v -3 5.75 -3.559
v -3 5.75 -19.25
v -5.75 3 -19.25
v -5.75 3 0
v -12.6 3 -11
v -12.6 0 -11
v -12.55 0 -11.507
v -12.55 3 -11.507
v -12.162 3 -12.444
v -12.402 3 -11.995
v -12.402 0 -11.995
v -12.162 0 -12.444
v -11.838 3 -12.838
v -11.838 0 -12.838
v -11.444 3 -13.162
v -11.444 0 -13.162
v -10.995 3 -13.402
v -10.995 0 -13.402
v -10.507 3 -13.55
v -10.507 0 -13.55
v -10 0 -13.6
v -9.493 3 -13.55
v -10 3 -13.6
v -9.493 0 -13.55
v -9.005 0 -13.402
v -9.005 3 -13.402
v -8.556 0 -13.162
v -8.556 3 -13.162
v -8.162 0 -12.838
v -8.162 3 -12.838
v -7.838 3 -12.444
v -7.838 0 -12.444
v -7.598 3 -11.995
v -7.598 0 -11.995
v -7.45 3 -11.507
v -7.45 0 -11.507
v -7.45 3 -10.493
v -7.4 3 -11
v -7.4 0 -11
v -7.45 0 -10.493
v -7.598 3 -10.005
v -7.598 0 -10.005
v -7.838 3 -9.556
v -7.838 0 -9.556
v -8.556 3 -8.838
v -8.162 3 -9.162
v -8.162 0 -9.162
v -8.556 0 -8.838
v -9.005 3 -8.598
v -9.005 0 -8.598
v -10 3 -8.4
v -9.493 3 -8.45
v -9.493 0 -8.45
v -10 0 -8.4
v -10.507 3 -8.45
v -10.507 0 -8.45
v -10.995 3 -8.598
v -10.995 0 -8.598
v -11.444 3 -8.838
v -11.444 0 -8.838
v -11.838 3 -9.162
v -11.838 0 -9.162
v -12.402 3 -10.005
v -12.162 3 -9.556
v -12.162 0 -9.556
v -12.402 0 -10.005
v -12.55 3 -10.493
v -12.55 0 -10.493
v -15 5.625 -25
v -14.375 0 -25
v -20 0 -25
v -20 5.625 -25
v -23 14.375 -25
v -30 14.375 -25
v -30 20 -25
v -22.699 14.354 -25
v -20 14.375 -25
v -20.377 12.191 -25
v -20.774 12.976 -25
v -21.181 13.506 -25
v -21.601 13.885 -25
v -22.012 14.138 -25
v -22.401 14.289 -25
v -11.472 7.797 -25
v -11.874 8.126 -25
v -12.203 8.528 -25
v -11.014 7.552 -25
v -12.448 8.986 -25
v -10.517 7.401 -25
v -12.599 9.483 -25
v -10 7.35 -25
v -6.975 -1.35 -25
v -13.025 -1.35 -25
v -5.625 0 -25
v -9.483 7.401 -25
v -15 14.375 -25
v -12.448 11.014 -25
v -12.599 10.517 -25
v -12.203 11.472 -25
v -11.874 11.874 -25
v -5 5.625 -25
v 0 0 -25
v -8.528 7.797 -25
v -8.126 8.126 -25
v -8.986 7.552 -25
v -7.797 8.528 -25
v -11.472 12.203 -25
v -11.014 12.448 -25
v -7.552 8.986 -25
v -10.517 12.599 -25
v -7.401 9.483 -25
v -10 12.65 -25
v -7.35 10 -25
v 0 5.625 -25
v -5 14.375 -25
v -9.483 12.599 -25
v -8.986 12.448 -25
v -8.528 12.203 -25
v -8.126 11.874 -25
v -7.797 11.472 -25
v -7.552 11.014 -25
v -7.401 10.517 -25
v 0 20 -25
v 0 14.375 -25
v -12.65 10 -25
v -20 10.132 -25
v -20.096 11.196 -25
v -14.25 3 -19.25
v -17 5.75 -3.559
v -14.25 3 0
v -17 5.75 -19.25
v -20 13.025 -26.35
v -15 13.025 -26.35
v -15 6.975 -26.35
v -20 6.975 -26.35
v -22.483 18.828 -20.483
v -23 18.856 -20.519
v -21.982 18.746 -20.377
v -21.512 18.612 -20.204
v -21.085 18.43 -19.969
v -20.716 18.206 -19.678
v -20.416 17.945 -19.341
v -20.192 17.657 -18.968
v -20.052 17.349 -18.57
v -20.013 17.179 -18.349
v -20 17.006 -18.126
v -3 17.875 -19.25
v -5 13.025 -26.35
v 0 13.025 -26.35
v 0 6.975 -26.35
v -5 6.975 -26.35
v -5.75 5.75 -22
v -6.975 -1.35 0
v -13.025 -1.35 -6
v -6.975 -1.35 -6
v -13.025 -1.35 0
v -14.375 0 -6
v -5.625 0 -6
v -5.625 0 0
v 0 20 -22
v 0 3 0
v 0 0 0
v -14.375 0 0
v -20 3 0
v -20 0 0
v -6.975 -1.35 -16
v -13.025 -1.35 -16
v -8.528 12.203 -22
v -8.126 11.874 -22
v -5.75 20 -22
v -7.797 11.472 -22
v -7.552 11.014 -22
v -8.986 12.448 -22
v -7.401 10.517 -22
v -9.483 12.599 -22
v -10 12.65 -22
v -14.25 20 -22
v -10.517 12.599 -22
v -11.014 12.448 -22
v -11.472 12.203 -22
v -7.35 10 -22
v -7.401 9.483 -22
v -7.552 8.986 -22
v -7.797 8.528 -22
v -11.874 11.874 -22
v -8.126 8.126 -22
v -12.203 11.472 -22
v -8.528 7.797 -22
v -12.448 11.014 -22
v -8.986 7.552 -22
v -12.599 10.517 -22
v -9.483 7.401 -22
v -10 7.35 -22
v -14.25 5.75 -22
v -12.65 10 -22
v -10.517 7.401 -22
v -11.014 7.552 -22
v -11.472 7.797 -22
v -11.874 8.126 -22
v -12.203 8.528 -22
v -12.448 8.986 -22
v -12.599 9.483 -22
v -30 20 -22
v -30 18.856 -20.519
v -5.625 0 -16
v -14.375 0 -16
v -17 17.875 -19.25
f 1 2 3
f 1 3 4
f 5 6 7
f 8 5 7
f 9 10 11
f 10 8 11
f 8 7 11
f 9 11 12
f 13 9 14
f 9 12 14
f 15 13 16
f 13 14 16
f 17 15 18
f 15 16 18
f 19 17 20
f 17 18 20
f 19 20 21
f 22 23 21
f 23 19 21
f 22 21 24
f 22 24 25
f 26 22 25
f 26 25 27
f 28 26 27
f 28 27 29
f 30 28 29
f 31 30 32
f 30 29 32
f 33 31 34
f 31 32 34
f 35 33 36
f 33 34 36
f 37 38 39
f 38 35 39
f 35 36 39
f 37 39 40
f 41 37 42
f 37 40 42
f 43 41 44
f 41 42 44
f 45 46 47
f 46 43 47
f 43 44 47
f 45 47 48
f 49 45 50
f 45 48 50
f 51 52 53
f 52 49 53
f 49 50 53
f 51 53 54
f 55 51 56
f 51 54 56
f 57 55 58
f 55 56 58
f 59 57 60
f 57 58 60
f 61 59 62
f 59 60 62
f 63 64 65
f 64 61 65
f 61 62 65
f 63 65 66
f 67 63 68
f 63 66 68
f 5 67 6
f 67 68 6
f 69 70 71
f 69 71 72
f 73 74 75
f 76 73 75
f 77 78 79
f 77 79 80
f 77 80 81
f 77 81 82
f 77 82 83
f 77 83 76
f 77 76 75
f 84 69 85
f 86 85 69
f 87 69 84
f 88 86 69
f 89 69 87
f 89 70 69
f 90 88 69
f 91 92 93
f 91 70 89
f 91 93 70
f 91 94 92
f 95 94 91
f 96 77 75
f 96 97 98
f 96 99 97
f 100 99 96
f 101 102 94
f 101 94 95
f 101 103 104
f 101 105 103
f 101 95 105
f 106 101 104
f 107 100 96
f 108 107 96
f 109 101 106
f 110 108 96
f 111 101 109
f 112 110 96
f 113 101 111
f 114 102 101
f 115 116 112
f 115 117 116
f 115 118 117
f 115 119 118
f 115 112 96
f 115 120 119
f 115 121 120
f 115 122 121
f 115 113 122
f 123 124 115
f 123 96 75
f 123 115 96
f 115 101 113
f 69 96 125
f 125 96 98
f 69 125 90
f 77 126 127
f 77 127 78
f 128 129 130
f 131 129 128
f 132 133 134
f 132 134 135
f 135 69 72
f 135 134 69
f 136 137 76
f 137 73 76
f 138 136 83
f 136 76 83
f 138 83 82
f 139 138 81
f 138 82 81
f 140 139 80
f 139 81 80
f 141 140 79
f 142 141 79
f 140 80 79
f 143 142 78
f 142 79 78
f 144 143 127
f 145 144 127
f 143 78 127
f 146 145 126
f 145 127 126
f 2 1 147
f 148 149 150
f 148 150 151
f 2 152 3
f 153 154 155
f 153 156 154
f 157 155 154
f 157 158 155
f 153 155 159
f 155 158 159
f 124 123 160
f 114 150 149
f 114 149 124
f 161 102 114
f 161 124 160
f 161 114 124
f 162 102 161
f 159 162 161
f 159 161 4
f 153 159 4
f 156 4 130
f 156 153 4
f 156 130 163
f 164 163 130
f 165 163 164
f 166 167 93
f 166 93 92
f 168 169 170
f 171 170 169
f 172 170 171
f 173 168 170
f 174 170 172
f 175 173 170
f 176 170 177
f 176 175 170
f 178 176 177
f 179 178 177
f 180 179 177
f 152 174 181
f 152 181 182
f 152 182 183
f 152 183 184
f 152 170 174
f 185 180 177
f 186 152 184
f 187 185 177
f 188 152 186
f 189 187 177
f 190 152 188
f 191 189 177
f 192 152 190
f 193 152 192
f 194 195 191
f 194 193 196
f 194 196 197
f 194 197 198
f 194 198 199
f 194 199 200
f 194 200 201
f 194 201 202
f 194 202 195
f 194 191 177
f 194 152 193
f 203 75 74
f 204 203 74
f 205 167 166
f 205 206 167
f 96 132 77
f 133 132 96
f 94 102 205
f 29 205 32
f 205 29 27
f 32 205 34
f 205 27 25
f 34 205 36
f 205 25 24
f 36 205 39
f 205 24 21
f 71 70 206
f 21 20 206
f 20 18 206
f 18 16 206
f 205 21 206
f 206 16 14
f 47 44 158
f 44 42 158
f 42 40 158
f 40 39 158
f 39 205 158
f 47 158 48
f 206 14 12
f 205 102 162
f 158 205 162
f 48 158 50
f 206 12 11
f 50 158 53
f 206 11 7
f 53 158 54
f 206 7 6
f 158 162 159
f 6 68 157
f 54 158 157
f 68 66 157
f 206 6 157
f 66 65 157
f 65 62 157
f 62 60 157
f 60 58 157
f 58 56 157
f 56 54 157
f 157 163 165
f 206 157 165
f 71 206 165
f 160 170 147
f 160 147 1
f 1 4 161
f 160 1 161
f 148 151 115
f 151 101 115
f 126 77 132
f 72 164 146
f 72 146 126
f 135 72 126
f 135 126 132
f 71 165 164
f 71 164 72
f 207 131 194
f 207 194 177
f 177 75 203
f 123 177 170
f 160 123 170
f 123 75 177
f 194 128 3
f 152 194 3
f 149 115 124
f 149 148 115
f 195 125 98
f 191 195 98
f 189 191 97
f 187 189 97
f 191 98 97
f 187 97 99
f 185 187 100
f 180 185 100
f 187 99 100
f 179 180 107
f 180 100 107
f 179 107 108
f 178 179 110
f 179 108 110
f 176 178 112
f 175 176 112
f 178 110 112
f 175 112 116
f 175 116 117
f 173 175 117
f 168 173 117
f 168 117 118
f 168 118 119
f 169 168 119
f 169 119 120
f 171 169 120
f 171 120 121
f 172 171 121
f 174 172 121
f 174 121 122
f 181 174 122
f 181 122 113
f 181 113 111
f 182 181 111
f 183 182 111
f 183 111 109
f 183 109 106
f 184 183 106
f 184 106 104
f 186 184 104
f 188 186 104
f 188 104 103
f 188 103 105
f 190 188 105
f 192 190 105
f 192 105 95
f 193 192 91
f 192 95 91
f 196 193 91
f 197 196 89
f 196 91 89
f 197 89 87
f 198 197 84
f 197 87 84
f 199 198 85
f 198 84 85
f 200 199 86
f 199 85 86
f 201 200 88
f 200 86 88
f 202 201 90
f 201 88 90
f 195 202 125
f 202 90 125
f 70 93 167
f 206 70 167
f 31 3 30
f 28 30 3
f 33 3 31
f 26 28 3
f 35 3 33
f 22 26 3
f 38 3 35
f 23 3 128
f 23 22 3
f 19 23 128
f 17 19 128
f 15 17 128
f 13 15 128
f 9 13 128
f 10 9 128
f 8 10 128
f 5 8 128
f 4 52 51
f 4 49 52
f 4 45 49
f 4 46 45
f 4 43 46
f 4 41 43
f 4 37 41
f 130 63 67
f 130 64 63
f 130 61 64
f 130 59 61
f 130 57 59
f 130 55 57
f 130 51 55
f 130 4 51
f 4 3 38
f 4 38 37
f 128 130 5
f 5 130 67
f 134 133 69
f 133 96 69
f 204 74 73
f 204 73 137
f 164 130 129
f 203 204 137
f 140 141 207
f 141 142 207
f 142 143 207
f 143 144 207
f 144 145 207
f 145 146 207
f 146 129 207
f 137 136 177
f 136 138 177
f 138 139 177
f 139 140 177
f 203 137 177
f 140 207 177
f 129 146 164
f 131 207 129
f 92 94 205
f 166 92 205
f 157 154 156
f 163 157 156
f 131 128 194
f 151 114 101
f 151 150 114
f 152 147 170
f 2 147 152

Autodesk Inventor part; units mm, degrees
ref_plane "YZ Plane" through (0, 0, 0) normal (1, 0, 0) x (0, 1, 0)
ref_plane "XZ Plane" through (0, 0, 0) normal (0, 1, 0) x (-1, 0, 0)
sketch "Sketch1" plane through (0, 0, 0) normal (0, 1, 0) x (-1, 0, 0)
  line L0 (0, 0) -> (20, 0)
  line L1 (20, 0) -> (20, -25)
  line L2 (20, -25) -> (0, -25)
  line L3 (0, -25) -> (0, 0)
  circle A0 centre (10, -11) radius 2.6
  line L4 (20, -25) -> (0, -25)
  line L5 (0, -25) -> (0, -22)
  line L6 (0, -22) -> (20, -22)
  line L7 (20, -22) -> (20, -25)
  line L8 (0, -22) -> (20, 0) construction
  point P0 (10, -11)
  dimension "d2" = 20
  dimension "d3" = 25
  dimension "d4" = 5.2
  dimension "d7" = 3
extrude "Extrusion1" add sketch "Sketch1" along normal blind 3
extrude "Extrusion2" add sketch "Sketch1" along normal blind 20 contours L6 L1 L2 L3
sketch "Sketch2" plane through (0, 0, -25) normal (0, 0, -1) x (-1, 0, 0)
  line L0 (0, 0) -> (0, 20) projected
  line L1 (20, 0) -> (20, 20) projected
  line L2 (0, 20) -> (20, 0) construction
  circle A0 centre (10, 10) radius 2.65
  dimension "d10" = 5.3
extrude "Extrusion3" cut sketch "Sketch2" against normal through all
ref_plane "Work Plane1" through (-20, 20, -22) normal (0, -0.791285, -0.6114475) x (1, 0, 0)
sketch "Sketch3" plane through (-20, 20, -22) normal (0, -0.791285, -0.6114475) x (1, 0, 0)
  line L0 (0, 27.8029) -> (20, 27.8029) projected
  line L1 (0, 0) -> (20, 0) projected
  line L2 (0, 10.3946) -> (0, 0) projected
  line L3 (0, 0) -> (3, 0)
  line L4 (3, 0) -> (3, 27.8029)
  line L5 (3, 27.8029) -> (0, 27.8029)
  line L6 (0, 27.8029) -> (0, 0)
  line L7 (20, 27.8029) -> (17, 27.8029)
  line L8 (17, 27.8029) -> (17, 0)
  line L9 (17, 0) -> (20, 0)
  line L10 (20, 0) -> (20, 27.8029)
  point P0 (20, 29.6372)
  point P1 (20, 0)
  dimension "d13" = 3
  dimension "d14" = 3
extrude "Extrusion4" add sketch "Sketch3" along normal up to next contours L0 L4 L1 L2 L6 | L0 L10 L1 L8
chamfer "Chamfer1" distance 2.75 angle 45 5 edges at (-10, 3, -22) (-3, 11.5, -22) (-3, 3, -11) (-17, 3, -11) (-17, 11.5, -22)
sketch "Sketch4" plane through (0, 0, 0) normal (0, -1, 0) x (1, 0, 0)
  line L0 (0, -25) -> (-20, -25) projected
  line L1 (-20, 0) -> (0, 0) projected
  line L2 (-14.375, -25) -> (-5.625, -25)
  line L3 (-5.625, -25) -> (-5.625, 0)
  line L4 (-5.625, 0) -> (-14.375, 0)
  line L5 (-14.375, 0) -> (-14.375, -25)
  circle A0 centre (-10, -11) radius 2.6 projected
  line L6 (-10, -25) -> (-10, 0) construction
  line L7 (-5.625, -6) -> (-14.375, -6)
  line L8 (-14.375, -6) -> (-14.375, -16)
  line L9 (-14.375, -16) -> (-5.625, -16)
  line L10 (-5.625, -16) -> (-5.625, -6)
  line L11 (-14.375, -16) -> (-5.625, -6) construction
  point P0 (-14.375, 0)
  dimension "d32" = 8.75
  dimension "d42" = 10
extrude "Extrusion5" add sketch "Sketch4" along normal blind 1.35 contours L0 L5 L9 L3 | L7 L5 L1 L3
sketch "Sketch5" plane through (0, 20, -25) normal (0, 0, -1) x (-1, 0, 0)
  line L0 (0, 0) -> (0, -17) projected
  line L1 (20, -17) -> (20, 0) projected
  line L2 (0, -5.625) -> (20, -5.625)
  line L3 (20, -5.625) -> (20, -14.375)
  line L4 (20, -14.375) -> (0, -14.375)
  line L5 (0, -14.375) -> (0, -5.625)
  line L6 (0, -14.375) -> (20, -5.625) construction
  circle A0 centre (10, -10) radius 2.65 projected
  line L7 (5, -5.625) -> (15, -5.625)
  line L8 (15, -5.625) -> (15, -14.375)
  line L9 (15, -14.375) -> (5, -14.375)
  line L10 (5, -14.375) -> (5, -5.625)
  line L11 (5, -5.625) -> (15, -14.375) construction
  point P0 (0, -20)
  point P1 (0, -14.375)
  point P2 (5, -14.375)
  dimension "d26" = 8.75
  dimension "d43" = 10
extrude "Extrusion6" add sketch "Sketch5" along normal blind 1.35 contours L2 L10 L4 L0 | L2 L1 L4 L8
chamfer "Chamfer2" distance 1.35 angle 45 8 edges at (-17.5, 5.625, -26.35) (-2.5, 5.625, -26.35) (-17.5, 14.375, -26.35) (-2.5, 14.375, -26.35) (-14.375, -1.35, -3) (-14.375, -1.35, -20.5) (-5.625, -1.35, -3) (-5.625, -1.35, -20.5)
sketch "Sketch9" plane through (-20, 0, -25) normal (-1, 0, 0) x (0, 0, 1)
  line L0 (-1.35, 6.975) -> (-1.35, 13.025) projected
  line L1 (0, 0) -> (0, 5.625) projected
  line L2 (0, 0) -> (25, 0) projected
  line L3 (25, 0) -> (25, 3) projected
  line L4 (25, 3) -> (3, 20) projected
  line L5 (0, 20) -> (3, 20) projected
  line L6 (0, 14.375) -> (0, 20) projected
  line L7 (0, 14.375) -> (4.4808, 18.8558)
  line L8 (-1.35, 13.025) -> (0, 14.375) projected
  line L9 (0, 5.625) -> (-1.35, 6.975) projected
  point P0 (25, 0)
extrude "Extrusion10" add sketch "Sketch9" along normal blind 10 contours L6 L5 L4 L7
fillet "Fillet2" radius 3 1 edges at (-20, 16.6154, -22.7596)
properties part number "Soporte Actuador MIR" material "PET Plastic"
